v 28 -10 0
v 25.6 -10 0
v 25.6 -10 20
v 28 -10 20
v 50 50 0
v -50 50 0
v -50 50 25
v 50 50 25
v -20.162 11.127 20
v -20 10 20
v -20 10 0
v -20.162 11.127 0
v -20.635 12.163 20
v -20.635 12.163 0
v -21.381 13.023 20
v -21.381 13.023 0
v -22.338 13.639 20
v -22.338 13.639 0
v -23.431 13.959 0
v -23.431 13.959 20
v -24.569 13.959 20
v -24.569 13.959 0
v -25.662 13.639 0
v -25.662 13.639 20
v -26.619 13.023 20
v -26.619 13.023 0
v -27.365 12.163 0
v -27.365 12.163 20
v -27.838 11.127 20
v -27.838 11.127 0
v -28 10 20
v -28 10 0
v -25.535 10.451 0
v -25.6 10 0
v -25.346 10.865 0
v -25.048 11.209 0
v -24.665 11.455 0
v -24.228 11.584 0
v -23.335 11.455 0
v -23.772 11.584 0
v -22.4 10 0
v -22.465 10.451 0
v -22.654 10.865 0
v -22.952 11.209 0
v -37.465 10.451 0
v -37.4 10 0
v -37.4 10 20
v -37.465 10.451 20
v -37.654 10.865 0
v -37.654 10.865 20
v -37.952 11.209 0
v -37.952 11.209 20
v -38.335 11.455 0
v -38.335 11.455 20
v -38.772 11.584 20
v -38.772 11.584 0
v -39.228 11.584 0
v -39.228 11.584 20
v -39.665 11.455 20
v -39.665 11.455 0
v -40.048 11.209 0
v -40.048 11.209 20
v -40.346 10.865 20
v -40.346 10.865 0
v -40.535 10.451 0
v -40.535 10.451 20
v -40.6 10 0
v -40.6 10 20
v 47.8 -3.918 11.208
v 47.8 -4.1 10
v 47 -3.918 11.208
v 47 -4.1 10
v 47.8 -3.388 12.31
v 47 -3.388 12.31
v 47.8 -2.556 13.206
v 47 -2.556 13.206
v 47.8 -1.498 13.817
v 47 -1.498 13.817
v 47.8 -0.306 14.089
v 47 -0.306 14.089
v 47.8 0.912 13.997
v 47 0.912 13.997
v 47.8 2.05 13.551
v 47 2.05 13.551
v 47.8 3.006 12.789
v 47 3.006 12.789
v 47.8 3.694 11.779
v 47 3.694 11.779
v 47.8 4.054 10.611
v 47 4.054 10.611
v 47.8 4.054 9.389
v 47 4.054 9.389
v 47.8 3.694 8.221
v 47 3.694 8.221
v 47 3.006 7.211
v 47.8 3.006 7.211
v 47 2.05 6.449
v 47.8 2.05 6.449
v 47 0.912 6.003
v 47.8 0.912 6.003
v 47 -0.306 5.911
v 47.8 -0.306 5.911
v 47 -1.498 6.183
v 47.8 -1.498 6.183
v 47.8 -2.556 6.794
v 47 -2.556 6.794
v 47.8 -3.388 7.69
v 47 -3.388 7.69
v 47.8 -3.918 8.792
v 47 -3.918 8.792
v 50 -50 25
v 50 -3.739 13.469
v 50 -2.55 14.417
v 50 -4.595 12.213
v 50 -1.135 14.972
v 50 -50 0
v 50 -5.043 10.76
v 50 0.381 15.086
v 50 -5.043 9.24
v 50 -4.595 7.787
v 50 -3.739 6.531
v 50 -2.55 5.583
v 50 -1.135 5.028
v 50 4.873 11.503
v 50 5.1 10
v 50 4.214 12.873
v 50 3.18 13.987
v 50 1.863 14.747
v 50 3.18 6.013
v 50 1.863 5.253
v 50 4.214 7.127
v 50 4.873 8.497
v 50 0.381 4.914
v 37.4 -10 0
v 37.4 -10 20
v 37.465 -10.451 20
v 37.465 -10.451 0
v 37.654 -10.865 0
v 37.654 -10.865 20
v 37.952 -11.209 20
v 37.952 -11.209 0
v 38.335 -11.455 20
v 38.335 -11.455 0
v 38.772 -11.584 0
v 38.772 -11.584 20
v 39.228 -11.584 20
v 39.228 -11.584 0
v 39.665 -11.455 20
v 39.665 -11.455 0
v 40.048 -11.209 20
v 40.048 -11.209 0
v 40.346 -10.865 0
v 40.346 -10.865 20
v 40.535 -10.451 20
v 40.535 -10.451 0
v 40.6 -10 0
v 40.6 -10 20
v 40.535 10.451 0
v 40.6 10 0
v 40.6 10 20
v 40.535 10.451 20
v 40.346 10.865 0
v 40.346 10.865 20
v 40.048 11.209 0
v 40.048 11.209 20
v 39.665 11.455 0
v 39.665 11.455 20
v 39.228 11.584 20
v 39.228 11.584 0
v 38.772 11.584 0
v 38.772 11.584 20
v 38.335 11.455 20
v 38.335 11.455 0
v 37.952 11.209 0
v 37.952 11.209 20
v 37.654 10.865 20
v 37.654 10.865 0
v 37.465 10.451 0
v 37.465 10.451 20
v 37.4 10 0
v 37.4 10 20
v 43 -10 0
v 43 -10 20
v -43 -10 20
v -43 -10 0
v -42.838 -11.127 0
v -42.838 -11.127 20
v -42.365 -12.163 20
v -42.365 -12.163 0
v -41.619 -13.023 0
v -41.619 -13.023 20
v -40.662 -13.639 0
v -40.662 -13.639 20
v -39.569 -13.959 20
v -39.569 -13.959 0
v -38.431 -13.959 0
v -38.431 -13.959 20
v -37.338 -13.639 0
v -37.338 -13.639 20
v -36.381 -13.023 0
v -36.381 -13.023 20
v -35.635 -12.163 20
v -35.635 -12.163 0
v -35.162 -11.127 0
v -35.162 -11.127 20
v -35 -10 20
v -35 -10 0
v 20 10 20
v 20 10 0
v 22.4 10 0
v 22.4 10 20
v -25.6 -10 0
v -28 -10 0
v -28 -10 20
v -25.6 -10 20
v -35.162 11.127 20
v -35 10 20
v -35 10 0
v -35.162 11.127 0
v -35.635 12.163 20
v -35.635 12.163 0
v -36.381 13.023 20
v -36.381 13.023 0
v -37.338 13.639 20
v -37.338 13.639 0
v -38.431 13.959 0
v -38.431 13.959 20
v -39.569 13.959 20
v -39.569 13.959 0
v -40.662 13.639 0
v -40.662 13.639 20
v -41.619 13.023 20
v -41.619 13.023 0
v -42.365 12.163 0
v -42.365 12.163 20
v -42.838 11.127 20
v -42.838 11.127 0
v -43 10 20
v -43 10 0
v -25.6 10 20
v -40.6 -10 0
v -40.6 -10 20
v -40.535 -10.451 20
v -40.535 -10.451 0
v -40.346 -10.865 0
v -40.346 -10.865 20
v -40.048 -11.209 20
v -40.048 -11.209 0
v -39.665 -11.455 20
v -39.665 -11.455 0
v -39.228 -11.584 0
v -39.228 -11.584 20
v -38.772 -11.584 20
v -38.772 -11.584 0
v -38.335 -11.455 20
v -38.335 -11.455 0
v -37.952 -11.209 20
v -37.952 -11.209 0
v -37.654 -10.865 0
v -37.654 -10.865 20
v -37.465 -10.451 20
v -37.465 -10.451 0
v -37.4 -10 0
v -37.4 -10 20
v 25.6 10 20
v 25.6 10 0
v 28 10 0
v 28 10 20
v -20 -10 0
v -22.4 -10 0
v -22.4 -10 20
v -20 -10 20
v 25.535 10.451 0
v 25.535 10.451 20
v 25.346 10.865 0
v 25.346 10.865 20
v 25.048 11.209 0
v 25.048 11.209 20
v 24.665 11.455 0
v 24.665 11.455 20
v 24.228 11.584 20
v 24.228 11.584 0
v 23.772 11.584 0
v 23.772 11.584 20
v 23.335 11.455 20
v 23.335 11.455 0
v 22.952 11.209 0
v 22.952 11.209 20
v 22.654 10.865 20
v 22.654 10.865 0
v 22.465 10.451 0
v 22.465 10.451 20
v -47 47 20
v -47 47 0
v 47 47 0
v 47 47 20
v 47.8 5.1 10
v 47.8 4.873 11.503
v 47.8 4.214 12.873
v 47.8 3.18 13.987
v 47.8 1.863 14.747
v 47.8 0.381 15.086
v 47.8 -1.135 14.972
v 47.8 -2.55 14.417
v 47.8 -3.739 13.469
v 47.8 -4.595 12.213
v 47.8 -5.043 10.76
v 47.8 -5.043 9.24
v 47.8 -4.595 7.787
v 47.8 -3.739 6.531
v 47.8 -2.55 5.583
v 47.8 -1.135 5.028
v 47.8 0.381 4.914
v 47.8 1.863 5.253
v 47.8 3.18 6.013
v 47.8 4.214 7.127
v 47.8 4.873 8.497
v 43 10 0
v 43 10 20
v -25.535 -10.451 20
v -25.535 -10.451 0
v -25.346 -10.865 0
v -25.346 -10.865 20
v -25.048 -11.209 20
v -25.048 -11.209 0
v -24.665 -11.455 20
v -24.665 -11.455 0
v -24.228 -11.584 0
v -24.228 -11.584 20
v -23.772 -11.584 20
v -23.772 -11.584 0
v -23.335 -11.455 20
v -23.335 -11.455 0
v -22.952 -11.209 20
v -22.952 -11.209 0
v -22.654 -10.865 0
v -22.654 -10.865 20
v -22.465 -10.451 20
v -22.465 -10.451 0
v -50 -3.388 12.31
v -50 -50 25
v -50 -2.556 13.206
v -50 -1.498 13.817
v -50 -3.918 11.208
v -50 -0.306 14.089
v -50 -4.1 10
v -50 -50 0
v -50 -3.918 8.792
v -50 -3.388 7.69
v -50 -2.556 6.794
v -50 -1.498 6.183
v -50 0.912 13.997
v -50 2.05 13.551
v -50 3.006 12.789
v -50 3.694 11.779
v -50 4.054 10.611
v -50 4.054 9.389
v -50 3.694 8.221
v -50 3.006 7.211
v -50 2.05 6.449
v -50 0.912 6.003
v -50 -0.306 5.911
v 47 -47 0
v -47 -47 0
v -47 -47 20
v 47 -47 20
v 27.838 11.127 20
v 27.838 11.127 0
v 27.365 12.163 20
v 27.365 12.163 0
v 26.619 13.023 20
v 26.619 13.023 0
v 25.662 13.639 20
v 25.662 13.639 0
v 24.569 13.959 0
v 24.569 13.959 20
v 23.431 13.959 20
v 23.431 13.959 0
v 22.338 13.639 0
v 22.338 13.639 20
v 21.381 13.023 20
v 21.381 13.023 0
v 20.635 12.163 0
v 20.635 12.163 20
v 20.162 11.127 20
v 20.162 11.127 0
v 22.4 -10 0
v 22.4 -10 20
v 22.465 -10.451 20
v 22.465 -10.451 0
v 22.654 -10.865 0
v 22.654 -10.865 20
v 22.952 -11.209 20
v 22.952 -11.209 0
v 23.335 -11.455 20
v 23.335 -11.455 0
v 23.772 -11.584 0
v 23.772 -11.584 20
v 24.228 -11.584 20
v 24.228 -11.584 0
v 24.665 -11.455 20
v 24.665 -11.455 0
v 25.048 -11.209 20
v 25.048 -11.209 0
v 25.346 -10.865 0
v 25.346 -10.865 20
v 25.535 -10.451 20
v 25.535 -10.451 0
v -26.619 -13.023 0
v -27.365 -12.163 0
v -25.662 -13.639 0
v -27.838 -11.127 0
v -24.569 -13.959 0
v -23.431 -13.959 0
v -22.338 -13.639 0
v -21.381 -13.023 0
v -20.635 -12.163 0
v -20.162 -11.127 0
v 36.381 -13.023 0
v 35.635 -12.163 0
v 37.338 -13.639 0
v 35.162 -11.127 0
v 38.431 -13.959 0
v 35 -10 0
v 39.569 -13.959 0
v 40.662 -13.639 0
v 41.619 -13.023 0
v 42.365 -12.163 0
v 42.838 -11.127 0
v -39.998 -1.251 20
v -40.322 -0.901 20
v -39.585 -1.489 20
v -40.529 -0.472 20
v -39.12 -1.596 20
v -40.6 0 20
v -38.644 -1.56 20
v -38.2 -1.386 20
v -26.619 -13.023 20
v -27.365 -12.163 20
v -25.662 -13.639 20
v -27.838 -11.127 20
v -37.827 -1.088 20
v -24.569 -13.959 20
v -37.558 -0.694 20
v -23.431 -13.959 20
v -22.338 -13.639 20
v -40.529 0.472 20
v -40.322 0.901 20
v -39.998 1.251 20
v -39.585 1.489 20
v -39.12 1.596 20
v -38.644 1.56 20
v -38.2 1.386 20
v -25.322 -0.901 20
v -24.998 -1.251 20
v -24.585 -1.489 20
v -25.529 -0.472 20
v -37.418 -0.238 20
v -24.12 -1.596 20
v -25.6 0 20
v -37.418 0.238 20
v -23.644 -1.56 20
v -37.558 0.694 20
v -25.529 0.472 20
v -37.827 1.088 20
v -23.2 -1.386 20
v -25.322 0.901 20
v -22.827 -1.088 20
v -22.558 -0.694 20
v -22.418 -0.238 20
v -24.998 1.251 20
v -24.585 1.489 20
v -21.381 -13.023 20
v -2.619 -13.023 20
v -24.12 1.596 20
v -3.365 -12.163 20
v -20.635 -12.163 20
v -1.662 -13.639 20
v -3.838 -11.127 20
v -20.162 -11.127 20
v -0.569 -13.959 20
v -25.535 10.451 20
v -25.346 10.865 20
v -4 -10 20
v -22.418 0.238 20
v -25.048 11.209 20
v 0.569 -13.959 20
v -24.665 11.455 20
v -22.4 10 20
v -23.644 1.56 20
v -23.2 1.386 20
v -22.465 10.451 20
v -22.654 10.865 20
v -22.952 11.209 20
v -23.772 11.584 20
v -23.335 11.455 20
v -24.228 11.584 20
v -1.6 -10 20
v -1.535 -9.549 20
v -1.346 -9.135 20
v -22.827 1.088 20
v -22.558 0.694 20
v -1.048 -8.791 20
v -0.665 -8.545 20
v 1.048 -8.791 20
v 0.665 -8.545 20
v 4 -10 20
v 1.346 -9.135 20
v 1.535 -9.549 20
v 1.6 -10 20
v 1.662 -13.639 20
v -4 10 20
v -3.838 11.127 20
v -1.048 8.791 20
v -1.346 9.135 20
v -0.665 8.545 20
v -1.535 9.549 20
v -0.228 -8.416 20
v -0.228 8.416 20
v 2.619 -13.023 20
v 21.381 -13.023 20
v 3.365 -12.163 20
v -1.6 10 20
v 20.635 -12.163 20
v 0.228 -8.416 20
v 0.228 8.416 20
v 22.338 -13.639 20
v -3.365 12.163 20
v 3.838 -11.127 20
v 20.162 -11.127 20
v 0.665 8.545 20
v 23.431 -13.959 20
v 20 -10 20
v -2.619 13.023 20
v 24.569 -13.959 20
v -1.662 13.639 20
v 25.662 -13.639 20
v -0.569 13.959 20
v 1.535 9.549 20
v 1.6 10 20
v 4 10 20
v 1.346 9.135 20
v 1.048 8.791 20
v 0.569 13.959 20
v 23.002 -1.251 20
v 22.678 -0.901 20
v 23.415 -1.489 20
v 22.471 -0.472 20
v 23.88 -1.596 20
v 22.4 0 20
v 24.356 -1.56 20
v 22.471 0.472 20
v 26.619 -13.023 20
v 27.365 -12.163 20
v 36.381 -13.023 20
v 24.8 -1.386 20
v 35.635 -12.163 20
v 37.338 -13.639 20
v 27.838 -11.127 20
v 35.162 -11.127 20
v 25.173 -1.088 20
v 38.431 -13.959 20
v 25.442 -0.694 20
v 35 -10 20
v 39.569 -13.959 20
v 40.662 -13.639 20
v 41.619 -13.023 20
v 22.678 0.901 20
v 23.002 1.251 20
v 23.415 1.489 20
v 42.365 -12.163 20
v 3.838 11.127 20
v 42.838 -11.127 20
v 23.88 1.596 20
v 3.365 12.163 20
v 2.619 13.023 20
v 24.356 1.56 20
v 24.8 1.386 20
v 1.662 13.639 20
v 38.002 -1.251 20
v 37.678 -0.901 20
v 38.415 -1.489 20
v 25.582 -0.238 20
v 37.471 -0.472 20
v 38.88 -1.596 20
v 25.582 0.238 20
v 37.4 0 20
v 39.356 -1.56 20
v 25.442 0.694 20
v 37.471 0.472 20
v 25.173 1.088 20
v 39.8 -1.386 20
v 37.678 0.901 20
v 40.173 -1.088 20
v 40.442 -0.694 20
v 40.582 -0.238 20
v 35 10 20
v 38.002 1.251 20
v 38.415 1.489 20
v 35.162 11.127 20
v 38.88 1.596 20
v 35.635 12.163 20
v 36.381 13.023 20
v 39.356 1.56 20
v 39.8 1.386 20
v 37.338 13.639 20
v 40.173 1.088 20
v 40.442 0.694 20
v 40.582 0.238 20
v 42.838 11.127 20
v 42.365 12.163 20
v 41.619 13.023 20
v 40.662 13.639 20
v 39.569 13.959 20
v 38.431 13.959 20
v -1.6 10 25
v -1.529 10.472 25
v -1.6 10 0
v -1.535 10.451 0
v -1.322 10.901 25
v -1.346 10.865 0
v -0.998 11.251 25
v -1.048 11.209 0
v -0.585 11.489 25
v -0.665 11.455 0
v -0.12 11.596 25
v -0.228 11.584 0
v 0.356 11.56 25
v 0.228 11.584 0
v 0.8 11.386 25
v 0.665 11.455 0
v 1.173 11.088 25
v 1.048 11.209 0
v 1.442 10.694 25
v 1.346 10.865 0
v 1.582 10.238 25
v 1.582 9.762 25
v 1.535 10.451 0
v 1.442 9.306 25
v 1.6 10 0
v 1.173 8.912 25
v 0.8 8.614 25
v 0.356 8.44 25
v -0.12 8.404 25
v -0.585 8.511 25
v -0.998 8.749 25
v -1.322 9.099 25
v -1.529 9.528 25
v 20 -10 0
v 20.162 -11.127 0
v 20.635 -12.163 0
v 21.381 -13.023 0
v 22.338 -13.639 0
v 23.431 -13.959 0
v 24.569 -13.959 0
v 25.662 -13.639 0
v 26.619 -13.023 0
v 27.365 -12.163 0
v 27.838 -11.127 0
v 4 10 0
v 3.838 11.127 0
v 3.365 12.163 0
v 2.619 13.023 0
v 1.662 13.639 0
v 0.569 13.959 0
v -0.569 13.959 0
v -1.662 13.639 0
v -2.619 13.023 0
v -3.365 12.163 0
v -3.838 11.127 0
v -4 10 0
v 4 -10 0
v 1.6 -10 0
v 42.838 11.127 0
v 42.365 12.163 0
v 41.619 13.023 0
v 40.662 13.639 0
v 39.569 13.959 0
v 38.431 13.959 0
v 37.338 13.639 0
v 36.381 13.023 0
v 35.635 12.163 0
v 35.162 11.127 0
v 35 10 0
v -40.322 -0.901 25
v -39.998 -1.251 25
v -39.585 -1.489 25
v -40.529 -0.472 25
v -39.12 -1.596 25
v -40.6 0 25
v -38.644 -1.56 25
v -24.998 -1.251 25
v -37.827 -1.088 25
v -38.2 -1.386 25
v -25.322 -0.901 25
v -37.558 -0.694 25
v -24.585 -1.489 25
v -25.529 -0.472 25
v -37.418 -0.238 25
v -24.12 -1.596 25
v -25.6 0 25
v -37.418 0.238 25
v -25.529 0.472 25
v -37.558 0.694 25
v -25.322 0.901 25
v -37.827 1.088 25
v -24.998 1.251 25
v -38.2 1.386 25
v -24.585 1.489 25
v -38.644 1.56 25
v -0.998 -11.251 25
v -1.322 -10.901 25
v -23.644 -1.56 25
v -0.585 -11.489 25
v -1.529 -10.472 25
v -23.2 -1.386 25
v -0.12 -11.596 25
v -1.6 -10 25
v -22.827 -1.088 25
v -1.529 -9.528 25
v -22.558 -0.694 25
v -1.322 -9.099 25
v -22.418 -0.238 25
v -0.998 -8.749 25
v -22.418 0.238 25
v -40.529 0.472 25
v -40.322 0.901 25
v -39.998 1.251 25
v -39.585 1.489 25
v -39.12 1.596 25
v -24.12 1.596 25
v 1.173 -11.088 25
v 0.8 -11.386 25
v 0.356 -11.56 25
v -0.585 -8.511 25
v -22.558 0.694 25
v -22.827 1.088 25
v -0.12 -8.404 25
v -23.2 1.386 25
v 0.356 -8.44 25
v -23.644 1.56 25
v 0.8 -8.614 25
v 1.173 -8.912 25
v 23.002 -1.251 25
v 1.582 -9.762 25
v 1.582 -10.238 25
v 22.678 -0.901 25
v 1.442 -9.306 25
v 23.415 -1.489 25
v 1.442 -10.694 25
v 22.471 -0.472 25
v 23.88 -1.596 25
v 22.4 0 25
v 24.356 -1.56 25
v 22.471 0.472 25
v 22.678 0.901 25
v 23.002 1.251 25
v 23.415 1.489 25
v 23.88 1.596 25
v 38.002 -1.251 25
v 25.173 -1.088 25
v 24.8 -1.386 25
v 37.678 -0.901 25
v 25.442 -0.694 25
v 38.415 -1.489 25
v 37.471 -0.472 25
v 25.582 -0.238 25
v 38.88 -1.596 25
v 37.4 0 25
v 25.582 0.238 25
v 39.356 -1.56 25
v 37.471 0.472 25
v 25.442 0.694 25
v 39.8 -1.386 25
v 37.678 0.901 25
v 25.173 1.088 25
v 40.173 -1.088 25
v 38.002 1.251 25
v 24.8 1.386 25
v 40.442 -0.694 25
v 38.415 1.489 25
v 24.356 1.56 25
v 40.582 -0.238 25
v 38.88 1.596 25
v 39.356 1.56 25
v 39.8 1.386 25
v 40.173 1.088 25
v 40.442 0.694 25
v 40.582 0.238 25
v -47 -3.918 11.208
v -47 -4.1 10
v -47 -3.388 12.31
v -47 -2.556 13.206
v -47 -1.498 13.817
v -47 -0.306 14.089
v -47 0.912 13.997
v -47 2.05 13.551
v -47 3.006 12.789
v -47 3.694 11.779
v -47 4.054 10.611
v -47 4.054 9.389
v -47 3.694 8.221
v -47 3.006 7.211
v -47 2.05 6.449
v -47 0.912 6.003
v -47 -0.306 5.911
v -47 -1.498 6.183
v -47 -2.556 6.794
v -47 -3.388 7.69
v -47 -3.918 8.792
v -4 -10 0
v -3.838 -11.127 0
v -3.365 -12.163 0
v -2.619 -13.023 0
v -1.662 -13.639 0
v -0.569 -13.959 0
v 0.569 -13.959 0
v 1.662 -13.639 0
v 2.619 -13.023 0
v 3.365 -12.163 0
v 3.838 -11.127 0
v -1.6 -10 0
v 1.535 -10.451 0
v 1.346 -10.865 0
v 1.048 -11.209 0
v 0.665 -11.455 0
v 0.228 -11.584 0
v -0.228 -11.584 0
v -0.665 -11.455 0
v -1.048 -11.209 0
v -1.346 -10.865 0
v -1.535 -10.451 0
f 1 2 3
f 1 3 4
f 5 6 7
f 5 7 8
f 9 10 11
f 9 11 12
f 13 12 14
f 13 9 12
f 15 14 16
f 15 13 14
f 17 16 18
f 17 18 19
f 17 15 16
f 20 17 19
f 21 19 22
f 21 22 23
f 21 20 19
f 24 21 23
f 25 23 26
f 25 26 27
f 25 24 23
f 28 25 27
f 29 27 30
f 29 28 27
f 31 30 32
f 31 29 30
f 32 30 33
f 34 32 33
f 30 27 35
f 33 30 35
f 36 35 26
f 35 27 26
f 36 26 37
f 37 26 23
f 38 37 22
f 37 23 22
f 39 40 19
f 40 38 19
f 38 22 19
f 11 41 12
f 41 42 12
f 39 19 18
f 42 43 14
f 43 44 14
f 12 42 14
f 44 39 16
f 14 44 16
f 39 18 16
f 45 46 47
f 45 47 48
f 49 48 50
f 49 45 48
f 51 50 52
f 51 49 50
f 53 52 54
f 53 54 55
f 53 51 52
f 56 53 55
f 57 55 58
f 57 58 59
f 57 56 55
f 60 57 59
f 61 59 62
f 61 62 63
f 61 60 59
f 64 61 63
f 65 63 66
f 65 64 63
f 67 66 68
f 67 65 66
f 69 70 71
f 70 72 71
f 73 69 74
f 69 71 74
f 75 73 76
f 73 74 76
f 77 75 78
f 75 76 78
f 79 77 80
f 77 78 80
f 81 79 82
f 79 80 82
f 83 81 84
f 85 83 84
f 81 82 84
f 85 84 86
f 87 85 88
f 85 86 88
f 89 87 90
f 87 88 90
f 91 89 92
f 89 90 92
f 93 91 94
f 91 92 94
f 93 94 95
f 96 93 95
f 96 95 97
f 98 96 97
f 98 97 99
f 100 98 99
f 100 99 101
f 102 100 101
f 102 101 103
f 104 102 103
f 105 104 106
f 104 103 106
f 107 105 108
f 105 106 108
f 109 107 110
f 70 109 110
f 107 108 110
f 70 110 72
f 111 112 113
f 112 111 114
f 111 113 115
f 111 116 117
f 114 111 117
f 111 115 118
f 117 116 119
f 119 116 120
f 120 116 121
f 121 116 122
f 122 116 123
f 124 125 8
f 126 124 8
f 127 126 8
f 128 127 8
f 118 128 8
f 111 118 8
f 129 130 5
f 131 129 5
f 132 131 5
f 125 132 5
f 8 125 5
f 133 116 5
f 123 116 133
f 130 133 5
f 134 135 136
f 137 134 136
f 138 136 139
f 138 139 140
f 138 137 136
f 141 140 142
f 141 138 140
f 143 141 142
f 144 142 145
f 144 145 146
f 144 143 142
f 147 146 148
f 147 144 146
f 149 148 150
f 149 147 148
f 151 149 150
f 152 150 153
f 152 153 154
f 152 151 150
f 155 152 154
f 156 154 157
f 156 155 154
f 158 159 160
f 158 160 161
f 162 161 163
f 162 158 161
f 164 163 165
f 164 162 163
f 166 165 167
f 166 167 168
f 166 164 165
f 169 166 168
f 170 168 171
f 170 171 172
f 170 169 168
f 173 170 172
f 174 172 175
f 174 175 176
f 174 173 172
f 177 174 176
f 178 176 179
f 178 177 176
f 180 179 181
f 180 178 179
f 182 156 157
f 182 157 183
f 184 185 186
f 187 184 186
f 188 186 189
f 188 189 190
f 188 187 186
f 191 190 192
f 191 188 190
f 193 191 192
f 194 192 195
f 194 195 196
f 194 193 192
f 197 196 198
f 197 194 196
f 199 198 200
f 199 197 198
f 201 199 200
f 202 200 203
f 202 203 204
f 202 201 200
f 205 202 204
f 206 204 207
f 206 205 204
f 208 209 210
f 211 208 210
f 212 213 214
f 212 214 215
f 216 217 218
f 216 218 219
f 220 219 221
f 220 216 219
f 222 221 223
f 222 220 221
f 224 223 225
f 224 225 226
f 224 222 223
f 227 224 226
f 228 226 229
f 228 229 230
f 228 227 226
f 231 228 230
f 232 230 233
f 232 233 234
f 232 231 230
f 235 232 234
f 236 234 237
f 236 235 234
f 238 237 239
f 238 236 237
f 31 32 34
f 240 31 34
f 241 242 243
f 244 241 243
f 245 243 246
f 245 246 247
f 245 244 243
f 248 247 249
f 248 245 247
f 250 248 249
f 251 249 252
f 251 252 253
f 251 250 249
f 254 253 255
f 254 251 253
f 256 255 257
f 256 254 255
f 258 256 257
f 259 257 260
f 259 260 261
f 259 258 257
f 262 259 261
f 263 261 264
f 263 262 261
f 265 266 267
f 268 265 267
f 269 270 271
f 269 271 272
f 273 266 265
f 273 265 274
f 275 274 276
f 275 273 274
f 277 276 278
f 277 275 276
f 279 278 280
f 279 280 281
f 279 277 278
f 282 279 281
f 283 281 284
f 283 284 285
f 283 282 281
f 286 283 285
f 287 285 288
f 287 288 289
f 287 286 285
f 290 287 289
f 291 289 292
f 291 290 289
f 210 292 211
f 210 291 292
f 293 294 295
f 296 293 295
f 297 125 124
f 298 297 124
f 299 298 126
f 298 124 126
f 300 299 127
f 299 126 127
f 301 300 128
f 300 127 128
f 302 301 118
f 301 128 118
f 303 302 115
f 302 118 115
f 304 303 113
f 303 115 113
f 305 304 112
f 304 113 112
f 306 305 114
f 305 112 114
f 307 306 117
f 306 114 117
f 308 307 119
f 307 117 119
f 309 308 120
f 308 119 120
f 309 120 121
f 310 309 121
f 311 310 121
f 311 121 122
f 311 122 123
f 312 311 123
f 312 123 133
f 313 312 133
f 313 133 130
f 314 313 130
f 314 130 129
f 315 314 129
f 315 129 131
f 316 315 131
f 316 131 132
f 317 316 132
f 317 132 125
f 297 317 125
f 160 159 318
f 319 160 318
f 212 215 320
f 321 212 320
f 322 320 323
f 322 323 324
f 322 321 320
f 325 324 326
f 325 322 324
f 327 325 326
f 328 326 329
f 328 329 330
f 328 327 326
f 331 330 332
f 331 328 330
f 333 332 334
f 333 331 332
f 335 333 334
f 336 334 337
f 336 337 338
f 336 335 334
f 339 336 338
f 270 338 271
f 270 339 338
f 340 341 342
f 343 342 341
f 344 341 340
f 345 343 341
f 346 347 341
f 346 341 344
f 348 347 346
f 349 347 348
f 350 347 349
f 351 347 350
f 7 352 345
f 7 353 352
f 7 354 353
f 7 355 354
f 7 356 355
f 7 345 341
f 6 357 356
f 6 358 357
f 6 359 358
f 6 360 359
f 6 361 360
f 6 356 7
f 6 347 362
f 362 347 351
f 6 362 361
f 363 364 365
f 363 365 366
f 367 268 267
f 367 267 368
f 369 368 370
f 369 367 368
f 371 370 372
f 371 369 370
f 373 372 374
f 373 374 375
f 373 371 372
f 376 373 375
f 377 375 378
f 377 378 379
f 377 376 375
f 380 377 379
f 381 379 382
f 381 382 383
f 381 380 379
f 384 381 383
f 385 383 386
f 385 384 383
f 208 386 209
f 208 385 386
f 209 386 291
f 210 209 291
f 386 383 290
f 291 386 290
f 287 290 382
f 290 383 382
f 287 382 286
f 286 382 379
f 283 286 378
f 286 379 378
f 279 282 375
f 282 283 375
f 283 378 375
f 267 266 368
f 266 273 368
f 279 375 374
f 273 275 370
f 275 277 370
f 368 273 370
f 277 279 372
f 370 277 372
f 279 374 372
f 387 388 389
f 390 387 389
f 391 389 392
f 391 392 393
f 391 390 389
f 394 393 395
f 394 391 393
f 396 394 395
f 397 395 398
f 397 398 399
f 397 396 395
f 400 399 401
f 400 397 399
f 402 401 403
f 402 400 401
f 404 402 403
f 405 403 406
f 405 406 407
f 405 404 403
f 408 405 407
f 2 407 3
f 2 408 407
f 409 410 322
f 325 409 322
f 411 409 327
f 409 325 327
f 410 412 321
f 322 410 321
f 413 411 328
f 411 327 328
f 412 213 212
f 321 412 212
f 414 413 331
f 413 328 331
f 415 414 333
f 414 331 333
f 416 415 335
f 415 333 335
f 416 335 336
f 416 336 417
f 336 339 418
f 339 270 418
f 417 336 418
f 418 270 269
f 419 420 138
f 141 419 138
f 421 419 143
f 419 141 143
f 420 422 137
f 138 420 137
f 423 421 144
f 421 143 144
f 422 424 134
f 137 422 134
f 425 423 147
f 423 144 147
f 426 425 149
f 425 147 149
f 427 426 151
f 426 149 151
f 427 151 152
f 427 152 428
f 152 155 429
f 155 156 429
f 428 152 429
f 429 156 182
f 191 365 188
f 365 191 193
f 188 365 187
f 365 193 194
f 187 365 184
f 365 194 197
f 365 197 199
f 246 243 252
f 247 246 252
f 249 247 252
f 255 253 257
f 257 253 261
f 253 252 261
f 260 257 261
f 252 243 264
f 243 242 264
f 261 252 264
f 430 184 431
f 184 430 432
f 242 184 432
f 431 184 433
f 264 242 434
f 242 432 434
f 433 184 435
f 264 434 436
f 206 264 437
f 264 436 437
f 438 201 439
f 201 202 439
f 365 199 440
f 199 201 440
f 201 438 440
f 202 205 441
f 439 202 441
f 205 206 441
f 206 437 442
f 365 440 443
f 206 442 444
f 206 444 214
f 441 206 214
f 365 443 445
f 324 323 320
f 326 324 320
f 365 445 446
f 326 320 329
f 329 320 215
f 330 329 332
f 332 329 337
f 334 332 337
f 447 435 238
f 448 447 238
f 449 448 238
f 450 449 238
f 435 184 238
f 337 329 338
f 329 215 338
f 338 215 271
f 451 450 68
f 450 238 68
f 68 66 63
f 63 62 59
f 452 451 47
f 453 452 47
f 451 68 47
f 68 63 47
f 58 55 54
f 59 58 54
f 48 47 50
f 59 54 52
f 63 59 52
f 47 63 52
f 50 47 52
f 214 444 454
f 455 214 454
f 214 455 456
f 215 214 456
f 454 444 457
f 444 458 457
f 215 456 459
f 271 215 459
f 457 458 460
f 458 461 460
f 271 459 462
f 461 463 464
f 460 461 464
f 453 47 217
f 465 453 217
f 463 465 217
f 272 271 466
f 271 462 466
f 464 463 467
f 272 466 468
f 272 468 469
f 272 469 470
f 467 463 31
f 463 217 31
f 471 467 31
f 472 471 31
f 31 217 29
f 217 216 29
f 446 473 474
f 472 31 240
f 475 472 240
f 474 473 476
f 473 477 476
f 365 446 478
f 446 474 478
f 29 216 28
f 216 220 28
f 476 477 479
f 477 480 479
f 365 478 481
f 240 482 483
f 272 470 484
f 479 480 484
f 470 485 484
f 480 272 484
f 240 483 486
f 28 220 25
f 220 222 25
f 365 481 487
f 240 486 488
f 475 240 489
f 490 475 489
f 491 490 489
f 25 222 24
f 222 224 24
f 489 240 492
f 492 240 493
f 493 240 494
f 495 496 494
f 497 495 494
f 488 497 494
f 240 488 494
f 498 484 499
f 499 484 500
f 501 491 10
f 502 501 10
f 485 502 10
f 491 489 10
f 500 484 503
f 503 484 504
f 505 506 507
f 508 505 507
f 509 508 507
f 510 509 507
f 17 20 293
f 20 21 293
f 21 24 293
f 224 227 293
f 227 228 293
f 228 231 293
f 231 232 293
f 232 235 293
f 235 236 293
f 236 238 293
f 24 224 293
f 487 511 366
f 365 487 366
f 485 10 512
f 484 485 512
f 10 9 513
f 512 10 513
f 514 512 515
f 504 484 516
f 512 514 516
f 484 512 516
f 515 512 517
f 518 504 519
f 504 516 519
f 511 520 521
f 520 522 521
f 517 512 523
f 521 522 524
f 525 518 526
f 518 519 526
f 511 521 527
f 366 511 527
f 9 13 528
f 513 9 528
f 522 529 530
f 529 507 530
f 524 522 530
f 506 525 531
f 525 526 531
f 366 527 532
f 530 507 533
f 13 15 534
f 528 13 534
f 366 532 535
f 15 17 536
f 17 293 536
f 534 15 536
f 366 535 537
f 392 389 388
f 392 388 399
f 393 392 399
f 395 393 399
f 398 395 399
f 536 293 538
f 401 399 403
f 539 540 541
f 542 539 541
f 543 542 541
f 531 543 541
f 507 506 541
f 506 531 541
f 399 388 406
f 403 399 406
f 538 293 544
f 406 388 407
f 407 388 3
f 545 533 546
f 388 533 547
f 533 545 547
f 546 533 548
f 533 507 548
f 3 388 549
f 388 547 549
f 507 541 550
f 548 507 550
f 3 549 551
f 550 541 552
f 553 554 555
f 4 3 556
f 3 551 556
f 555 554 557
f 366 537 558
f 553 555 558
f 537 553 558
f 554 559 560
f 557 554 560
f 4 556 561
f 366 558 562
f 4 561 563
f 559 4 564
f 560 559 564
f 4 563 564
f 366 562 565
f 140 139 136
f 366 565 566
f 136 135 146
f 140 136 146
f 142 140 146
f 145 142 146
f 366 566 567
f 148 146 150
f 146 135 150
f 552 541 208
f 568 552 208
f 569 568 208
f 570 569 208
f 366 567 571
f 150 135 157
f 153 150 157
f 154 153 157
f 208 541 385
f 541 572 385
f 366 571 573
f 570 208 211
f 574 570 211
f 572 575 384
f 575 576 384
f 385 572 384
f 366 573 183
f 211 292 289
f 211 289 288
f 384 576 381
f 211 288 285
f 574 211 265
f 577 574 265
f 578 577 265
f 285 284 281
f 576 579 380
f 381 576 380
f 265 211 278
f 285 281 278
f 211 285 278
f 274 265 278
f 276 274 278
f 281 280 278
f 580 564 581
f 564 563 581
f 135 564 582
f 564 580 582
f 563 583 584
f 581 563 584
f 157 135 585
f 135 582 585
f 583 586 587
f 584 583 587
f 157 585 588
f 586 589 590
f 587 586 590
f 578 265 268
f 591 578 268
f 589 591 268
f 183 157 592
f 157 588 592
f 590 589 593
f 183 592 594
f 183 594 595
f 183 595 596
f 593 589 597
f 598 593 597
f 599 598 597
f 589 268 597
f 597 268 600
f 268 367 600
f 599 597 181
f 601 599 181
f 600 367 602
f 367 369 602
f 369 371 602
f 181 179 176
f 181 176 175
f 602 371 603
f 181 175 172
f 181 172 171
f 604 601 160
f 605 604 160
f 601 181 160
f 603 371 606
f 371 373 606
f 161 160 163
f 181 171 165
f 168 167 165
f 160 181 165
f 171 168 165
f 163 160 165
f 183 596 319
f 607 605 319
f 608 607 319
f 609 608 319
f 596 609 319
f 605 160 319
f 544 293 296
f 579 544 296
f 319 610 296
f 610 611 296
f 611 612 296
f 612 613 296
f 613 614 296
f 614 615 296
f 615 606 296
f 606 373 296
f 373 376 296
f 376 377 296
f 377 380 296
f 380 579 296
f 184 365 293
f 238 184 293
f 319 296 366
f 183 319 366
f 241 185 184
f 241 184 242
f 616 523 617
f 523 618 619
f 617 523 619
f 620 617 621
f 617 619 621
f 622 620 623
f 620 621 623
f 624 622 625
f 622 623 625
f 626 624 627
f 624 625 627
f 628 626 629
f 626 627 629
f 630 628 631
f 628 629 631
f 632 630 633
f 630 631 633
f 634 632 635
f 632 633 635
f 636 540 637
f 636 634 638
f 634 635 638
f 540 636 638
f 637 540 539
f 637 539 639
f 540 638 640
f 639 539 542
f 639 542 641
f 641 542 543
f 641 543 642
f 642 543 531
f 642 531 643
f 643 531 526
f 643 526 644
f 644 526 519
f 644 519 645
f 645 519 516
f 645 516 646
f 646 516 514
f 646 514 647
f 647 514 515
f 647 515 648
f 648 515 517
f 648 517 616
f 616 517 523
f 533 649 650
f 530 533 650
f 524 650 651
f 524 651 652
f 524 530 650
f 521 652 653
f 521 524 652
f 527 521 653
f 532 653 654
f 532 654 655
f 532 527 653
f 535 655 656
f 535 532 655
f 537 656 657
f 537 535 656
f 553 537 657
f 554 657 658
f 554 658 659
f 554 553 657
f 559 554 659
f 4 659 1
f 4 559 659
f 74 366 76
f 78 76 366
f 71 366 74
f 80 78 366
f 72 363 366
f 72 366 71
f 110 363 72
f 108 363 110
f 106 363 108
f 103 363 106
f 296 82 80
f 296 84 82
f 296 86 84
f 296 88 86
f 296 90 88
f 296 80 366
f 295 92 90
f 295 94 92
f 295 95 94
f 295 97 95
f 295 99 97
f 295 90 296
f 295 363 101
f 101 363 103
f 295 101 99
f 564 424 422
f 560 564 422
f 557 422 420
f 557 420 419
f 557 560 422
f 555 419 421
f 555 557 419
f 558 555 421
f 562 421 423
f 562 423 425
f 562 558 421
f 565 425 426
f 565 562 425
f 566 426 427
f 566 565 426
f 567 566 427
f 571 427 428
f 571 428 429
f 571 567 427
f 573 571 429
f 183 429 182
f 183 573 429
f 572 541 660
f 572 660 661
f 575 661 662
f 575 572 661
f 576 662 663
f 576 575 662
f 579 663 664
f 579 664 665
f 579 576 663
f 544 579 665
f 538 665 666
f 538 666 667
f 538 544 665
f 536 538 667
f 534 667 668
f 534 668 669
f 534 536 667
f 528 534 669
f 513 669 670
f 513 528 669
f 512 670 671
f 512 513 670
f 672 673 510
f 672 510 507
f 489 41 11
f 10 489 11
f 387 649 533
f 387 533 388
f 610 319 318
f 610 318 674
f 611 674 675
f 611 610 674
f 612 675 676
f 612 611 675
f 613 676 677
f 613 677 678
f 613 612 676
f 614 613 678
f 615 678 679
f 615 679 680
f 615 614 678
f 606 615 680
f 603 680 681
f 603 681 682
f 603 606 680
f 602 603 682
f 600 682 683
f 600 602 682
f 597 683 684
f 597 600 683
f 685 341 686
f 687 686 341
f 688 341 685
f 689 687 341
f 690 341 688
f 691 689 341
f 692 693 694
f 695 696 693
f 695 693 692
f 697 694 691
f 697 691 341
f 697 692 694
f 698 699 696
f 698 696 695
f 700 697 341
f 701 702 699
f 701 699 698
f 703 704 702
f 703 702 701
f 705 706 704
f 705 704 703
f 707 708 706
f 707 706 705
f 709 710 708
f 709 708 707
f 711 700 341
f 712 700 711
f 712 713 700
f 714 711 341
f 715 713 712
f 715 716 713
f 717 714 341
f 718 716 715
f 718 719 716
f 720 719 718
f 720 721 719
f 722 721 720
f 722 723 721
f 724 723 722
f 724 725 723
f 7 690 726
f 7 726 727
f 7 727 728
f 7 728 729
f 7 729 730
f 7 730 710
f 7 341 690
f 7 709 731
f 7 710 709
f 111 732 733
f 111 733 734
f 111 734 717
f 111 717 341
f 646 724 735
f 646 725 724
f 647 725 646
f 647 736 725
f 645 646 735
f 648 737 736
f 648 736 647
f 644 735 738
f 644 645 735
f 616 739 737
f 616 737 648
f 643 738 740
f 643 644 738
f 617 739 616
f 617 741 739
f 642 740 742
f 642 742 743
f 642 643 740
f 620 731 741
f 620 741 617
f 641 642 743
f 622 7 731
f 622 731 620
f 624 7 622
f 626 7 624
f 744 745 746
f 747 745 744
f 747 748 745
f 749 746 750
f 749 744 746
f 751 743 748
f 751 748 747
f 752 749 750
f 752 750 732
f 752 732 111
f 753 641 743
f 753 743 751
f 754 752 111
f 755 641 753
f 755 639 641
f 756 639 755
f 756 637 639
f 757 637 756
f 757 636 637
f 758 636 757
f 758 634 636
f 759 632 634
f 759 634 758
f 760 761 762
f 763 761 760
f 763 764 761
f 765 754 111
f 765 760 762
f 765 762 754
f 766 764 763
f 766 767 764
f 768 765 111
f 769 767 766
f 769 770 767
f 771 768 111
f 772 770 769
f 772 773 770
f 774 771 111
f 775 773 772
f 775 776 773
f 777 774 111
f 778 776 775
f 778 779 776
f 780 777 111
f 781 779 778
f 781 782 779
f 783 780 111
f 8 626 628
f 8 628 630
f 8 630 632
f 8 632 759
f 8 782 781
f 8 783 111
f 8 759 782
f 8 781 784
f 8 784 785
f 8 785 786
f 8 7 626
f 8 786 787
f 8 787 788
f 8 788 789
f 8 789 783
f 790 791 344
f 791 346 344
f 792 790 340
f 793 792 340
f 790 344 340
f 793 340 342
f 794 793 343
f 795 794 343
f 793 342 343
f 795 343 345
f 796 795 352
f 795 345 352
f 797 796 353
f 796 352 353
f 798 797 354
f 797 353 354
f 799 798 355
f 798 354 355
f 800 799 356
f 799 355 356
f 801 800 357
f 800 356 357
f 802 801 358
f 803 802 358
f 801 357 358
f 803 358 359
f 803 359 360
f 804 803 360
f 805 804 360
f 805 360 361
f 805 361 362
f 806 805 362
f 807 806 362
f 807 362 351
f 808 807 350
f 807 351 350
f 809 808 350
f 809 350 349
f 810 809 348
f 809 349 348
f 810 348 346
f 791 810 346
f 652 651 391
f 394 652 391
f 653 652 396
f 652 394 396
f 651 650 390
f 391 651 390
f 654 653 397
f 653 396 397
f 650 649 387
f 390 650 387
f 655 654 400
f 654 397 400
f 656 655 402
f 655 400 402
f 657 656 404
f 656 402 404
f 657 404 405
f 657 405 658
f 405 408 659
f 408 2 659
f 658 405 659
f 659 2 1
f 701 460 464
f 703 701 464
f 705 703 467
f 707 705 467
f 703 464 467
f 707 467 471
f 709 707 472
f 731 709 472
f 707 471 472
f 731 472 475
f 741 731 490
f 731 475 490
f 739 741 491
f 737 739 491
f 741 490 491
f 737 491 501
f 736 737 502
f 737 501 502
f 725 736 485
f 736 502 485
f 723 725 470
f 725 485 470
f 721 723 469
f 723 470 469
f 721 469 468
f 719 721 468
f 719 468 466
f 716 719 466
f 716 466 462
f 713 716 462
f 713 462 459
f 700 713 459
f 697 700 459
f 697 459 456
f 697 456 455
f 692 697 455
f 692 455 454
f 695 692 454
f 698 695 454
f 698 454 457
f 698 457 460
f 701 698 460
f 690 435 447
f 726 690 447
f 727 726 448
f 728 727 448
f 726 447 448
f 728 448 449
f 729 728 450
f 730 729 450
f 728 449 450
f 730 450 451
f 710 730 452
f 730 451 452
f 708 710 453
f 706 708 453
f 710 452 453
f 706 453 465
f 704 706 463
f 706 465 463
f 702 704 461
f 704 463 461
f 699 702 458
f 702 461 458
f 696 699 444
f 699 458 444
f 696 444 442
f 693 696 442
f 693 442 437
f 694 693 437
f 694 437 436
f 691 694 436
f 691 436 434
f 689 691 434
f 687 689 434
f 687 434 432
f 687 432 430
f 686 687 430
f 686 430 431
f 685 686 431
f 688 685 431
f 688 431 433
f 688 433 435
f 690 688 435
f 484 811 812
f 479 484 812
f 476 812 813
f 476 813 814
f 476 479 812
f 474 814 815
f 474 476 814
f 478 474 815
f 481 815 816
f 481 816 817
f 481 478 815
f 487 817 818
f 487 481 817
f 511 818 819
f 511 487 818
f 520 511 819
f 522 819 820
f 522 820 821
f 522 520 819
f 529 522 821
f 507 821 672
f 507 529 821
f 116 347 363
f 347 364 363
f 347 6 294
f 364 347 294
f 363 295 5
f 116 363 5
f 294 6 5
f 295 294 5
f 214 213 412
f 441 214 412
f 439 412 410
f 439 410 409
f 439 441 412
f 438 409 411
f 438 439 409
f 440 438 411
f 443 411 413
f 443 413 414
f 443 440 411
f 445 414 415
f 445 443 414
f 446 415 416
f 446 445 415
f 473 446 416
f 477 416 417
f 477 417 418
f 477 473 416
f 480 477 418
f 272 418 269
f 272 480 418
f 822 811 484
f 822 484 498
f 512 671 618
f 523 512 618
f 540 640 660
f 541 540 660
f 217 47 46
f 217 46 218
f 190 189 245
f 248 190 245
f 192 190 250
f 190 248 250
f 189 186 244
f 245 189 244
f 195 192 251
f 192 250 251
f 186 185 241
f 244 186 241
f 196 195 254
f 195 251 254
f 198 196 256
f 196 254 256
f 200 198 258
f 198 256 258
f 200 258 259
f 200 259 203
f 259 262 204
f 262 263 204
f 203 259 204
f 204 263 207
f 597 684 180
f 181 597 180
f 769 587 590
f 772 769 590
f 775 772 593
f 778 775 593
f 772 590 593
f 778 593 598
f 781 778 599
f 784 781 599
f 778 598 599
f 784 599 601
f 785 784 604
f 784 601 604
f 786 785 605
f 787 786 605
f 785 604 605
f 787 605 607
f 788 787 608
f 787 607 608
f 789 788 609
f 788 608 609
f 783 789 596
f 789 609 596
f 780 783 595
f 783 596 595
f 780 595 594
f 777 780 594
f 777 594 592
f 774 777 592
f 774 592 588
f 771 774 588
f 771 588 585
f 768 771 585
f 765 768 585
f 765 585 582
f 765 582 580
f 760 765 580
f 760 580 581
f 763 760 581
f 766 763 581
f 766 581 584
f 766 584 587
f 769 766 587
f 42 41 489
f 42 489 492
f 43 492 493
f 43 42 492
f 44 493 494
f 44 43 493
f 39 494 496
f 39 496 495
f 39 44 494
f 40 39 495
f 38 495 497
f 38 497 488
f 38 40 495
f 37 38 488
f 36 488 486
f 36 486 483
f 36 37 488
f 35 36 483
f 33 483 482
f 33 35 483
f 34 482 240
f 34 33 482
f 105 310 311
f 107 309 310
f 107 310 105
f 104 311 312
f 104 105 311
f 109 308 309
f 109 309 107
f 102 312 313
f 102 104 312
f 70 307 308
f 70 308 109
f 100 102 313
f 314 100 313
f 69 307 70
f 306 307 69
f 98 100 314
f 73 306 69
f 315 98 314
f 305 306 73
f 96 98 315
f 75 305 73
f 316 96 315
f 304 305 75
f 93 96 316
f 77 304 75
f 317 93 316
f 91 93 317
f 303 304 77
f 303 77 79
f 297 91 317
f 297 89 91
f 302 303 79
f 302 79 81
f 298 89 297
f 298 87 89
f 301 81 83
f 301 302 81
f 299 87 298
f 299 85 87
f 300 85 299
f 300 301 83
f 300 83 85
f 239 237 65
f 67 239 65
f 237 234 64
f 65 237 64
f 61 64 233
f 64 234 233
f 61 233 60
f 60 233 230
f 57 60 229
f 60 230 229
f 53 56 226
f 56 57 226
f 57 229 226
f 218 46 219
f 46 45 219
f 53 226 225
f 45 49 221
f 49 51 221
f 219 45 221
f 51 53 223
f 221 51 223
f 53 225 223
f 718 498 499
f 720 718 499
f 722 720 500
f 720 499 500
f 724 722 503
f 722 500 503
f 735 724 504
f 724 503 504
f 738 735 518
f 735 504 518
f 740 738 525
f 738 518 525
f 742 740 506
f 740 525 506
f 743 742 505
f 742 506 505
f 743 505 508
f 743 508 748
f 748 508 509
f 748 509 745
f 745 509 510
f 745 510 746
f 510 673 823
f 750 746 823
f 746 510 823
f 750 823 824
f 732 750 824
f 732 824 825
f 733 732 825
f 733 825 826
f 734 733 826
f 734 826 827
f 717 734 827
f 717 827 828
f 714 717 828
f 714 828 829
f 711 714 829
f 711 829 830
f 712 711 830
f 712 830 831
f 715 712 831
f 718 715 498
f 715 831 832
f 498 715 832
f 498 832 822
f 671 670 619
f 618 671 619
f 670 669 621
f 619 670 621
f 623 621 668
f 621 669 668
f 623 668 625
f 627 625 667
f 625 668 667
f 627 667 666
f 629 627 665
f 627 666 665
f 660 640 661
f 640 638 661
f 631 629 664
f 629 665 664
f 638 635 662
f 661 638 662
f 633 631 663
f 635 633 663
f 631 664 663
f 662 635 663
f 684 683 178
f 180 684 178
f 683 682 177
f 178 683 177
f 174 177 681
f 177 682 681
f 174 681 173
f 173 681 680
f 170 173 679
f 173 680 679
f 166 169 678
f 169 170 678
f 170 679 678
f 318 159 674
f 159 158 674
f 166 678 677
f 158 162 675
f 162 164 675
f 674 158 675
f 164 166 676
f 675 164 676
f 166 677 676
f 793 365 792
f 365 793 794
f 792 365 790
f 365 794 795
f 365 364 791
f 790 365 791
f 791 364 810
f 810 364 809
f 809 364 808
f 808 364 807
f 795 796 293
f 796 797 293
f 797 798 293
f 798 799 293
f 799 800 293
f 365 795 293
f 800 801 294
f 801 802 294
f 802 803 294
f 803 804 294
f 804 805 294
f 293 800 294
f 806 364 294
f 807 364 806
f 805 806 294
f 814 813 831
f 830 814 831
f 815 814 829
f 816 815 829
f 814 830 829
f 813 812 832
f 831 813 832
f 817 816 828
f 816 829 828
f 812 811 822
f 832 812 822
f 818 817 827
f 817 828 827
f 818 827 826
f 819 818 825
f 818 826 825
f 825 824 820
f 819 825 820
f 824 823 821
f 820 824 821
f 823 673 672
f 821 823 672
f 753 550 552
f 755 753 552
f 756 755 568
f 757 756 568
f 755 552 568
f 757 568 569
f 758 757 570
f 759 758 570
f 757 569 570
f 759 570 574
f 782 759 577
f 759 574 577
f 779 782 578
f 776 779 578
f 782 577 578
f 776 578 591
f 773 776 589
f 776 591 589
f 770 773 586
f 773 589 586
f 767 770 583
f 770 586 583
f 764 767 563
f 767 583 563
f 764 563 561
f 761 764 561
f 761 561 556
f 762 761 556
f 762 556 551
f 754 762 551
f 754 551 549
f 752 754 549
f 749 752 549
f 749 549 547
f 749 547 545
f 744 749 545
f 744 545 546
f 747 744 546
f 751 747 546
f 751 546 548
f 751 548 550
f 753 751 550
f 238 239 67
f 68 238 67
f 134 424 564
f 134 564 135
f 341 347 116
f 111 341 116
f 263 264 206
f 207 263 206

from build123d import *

# Parameters (mm, degrees)
F0_W           = 100
F0_H           = 100
F1_DEPTH       = 25
F2_W           = 94
F2_H           = 94
F3_DEPTH       = 20
F5_D           = 8.2
F5_CBORE_D     = 10.2
F5_CBORE_DEPTH = 2.2
F6_R           = 4
F7_DEPTH       = 25
F9_D           = 3.2
F10_R          = 1.6
F11_DEPTH      = 20
F12_W          = 94
F12_H          = 20
F13_DEPTH      = 20


with BuildPart() as f1:
    # F0 (on Top) → F1 (new body)
    with BuildSketch(Plane.XY):
        Rectangle(F0_W, F0_H)
    extrude(amount=F1_DEPTH)

    # F2 (on Top) → F3 (cut)
    with BuildSketch(Plane.XY):
        Rectangle(F2_W, F2_H)
    extrude(amount=F3_DEPTH, mode=Mode.SUBTRACT)

    # F5 (through all)
    with Locations(Plane.YZ.offset(50)):
        with Locations((0, 10)):
            CounterBoreHole(F5_D / 2, F5_CBORE_D / 2, F5_CBORE_DEPTH)

    # F6 (on face) → F7 (join)
    with BuildSketch(Plane.XY.offset(25)):
        with Locations((0, -10)):
            Circle(F6_R)
        with Locations((0, 10)):
            Circle(F6_R)
        with Locations((-24, 10)):
            Circle(F6_R)
        with Locations((-39, 10)):
            Circle(F6_R)
        with Locations((24, 10)):
            Circle(F6_R)
        with Locations((39, 10)):
            Circle(F6_R)
        with Locations((-24, -10)):
            Circle(F6_R)
        with Locations((24, -10)):
            Circle(F6_R)
        with Locations((39, -10)):
            Circle(F6_R)
        with Locations((-39, -10)):
            Circle(F6_R)
    extrude(amount=-F7_DEPTH)

    # F9 (through all)
    with Locations(Plane.XY.offset(25)):
        with Locations((-39, 0), (-24, 0), (0, 10), (24, 0), (39, 0), (0, -10)):
            Hole(F9_D / 2)

    # F10 (on Top) → F11 (cut)
    with BuildSketch(Plane.XY):
        with Locations((-39, -10)):
            Circle(F10_R)
        with Locations((-24, -10)):
            Circle(F10_R)
        with Locations((-24, 10)):
            Circle(F10_R)
        with Locations((-39, 10)):
            Circle(F10_R)
        with Locations((24, 10)):
            Circle(F10_R)
        with Locations((39, 10)):
            Circle(F10_R)
        with Locations((39, -10)):
            Circle(F10_R)
        with Locations((24, -10)):
            Circle(F10_R)
    extrude(amount=F11_DEPTH, mode=Mode.SUBTRACT)

    # F12 (on Top) → F13 (cut)
    with BuildSketch(Plane.XY):
        Rectangle(F12_W, F12_H)
    extrude(amount=F13_DEPTH, mode=Mode.SUBTRACT)


solid = f1.part
